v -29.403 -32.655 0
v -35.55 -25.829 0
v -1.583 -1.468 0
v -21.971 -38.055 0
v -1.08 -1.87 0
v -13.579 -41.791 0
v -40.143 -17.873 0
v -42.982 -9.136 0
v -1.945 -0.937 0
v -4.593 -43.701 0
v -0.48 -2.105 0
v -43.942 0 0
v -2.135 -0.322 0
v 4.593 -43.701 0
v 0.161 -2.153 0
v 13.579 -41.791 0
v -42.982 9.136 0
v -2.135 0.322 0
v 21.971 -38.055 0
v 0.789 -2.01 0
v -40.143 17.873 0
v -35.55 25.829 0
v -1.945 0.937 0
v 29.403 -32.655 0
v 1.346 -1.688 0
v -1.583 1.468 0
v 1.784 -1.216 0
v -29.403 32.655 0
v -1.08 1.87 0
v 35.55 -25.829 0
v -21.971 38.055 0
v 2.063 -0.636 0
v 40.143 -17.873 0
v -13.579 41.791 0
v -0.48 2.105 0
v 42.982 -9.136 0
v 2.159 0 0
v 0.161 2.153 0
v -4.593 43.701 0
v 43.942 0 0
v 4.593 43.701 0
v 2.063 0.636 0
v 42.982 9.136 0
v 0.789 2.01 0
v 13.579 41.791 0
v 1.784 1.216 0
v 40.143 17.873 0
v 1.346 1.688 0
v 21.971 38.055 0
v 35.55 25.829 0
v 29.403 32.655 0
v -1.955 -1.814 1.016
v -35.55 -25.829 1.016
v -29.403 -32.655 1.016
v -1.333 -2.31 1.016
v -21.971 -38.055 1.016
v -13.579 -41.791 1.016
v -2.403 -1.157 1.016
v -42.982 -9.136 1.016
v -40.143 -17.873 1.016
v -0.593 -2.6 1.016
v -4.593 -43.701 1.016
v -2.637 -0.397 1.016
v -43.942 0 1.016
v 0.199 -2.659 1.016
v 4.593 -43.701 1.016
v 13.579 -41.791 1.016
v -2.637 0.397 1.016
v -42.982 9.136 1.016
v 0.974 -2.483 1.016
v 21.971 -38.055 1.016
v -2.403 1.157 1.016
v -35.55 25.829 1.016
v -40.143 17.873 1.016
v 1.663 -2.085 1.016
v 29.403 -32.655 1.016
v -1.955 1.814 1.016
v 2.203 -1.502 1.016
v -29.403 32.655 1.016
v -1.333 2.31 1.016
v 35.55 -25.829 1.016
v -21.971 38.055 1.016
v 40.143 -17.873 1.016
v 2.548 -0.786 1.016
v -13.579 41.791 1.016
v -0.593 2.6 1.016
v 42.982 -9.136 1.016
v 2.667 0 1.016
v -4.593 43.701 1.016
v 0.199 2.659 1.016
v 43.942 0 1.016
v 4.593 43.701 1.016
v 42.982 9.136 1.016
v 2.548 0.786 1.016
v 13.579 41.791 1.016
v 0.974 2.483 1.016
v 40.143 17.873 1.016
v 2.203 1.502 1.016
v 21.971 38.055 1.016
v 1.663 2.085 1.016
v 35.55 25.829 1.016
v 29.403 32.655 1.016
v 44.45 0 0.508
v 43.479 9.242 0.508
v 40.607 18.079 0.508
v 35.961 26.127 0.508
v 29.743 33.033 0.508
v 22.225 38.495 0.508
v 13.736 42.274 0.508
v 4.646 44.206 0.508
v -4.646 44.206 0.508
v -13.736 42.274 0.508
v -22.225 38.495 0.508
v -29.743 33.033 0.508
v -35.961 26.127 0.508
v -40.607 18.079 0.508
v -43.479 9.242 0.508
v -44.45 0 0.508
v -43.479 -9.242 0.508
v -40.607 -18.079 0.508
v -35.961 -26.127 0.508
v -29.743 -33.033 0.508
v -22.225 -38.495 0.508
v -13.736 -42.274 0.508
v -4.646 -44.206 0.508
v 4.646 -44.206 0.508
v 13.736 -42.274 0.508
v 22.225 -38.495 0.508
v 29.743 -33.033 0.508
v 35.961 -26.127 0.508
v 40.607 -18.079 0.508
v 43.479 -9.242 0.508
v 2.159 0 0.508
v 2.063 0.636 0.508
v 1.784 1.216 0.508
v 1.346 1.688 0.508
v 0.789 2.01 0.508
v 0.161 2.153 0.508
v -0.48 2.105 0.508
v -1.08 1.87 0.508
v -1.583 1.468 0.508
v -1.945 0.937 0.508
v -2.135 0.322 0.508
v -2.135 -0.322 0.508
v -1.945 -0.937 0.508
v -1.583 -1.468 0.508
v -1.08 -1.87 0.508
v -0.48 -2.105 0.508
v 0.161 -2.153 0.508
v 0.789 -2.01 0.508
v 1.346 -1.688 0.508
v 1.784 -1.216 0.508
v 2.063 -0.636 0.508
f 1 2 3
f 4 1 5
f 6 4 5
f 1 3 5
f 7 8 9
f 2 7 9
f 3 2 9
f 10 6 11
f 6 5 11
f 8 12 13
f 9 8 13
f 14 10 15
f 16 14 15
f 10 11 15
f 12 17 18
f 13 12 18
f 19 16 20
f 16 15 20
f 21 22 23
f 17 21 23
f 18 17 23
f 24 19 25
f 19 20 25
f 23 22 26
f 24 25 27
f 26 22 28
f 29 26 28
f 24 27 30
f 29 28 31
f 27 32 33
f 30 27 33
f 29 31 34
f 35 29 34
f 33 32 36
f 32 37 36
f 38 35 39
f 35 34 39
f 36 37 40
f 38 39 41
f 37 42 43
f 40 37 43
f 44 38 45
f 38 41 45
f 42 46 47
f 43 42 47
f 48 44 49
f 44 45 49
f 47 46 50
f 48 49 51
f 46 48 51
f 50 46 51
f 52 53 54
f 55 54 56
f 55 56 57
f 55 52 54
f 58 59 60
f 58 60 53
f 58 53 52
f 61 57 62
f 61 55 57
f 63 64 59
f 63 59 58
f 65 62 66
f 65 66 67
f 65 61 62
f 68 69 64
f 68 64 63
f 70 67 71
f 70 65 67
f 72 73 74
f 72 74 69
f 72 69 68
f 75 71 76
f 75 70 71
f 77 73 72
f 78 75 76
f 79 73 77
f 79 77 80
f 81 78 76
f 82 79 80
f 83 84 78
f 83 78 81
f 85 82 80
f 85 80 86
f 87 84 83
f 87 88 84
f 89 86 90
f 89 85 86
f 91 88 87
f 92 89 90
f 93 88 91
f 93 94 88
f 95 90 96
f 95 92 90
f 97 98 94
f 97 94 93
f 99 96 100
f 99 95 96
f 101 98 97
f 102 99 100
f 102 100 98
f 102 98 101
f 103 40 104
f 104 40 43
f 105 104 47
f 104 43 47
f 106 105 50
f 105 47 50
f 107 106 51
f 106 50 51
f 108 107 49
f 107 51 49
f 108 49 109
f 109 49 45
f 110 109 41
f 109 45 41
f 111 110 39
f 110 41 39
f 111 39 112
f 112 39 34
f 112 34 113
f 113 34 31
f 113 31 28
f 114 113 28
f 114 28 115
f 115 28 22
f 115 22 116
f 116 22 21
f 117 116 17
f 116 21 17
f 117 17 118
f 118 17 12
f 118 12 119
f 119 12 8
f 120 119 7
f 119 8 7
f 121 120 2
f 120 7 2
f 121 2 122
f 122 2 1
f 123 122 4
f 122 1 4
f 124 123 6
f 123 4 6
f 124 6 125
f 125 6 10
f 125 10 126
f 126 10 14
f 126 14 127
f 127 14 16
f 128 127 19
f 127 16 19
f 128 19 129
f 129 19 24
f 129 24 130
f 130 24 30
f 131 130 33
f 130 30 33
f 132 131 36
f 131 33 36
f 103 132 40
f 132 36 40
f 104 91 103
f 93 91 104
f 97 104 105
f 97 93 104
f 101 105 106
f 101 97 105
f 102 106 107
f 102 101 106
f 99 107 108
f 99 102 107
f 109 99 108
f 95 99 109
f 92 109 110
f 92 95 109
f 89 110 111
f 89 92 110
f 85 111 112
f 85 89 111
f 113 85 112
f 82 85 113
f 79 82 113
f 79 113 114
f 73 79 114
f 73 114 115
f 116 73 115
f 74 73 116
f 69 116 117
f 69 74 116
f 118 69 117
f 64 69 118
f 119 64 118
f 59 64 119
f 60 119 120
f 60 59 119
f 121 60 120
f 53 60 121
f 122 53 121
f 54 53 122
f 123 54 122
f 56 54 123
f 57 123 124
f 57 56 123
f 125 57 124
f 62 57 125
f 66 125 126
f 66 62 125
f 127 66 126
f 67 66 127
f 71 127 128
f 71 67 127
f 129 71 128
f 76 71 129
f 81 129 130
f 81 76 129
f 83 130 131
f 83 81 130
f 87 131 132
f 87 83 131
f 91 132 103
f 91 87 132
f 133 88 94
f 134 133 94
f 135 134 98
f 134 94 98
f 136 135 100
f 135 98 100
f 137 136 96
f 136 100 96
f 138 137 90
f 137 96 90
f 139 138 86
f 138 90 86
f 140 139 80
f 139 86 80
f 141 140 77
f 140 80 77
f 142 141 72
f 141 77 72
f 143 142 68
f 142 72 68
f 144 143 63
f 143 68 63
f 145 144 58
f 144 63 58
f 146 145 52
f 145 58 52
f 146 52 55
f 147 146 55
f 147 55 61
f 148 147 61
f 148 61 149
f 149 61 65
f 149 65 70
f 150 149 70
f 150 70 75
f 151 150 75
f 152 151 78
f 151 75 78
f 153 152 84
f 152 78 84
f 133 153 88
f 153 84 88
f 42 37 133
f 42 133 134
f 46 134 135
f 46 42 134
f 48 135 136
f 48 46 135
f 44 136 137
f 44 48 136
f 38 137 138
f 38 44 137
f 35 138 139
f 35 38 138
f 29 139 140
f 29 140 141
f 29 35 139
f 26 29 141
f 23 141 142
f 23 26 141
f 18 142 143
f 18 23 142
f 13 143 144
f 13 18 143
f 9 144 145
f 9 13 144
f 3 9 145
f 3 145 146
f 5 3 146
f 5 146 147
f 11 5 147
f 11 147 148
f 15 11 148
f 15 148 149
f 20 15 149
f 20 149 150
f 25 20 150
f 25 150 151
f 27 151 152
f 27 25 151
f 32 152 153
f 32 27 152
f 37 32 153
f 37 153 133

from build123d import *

# Parameters (mm, degrees)
SKETCH1_R           = 44.45
SKETCH1_R_2         = 2.159
BOSS_EXTRUDE1_DEPTH = 1.016
CHAMFER2_SIZE       = 0.508


with BuildPart() as part:
    # Sketch1 → Boss-Extrude1 (new body)
    with BuildSketch(Plane.XY):
        Circle(SKETCH1_R)
        Circle(SKETCH1_R_2, mode=Mode.SUBTRACT)
    extrude(amount=BOSS_EXTRUDE1_DEPTH)

    # Chamfer2
    chamfer2_edges = [part.edges().sort_by_distance(p)[0] for p in [
        (-44.45, 0, 0),
        (-44.45, 0, 1.016),
        (-2.159, 0, 1.016),
    ]]
    chamfer(chamfer2_edges, length=CHAMFER2_SIZE - 0.0001)  # a hair under: the kernel refuses the full size


solid = part.part
